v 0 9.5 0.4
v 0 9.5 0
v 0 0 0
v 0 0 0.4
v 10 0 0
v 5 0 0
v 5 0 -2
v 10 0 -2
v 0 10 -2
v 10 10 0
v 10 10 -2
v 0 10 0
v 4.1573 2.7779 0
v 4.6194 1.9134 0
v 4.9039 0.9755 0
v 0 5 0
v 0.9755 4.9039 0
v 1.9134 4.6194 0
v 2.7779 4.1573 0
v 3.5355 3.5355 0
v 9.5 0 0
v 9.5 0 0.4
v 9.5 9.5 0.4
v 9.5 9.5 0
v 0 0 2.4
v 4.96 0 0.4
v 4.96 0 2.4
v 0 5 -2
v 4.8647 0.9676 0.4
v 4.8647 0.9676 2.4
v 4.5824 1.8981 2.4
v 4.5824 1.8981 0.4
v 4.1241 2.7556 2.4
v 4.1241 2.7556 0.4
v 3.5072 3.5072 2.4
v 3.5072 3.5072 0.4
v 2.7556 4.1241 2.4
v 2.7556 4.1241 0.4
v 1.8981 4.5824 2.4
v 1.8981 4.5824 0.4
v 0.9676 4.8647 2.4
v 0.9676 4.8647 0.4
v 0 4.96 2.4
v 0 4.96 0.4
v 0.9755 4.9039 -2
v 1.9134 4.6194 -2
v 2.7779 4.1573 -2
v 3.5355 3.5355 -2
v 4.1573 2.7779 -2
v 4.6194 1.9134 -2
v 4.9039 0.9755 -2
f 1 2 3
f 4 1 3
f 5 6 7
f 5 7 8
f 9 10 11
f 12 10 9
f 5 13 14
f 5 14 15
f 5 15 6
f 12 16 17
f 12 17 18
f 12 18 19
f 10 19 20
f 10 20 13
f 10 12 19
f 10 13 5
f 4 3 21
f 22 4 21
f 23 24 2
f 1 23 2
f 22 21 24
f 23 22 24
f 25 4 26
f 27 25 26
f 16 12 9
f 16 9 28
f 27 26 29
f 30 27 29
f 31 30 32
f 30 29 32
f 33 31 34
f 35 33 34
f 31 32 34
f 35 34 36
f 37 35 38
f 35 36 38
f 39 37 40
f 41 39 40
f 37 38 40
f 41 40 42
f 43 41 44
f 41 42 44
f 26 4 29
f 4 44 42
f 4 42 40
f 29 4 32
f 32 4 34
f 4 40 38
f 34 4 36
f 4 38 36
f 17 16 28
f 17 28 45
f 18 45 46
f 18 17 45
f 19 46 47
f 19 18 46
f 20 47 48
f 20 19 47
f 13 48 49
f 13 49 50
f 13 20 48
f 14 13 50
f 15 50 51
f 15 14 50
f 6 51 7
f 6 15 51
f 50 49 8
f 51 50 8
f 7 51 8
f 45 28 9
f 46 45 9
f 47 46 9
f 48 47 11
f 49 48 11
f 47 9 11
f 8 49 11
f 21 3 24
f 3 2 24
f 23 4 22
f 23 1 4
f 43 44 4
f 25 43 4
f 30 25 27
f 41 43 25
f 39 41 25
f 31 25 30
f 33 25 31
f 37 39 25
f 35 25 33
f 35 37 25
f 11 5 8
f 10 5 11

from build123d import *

# Parameters (mm, degrees)
F1_DEPTH = 2
F3_DEPTH = 0.4
F5_DEPTH = 2


with BuildPart() as f1:
    # F0 (on Top) → F1 (new body)
    with BuildSketch(Plane.XY):
        with BuildLine():
            ThreePointArc((0, 5), (3.5355339059, 3.5355339059), (5, 0))
            Line((5, 0), (10, 0))
            Line((10, 0), (10, 10))
            Line((10, 10), (0, 10))
            Line((0, 10), (0, 5))
        make_face()
    extrude(amount=-F1_DEPTH)


with BuildPart() as f3:
    # F2 (on face) → F3 (new body)
    with BuildSketch(Plane.XY):
        with BuildLine():
            Line((0, 5), (0, 0))
            Line((0, 0), (5, 0))
            ThreePointArc((5, 0), (3.5355339059, 3.5355339059), (0, 5))
        make_face()
        with BuildLine():
            ThreePointArc((0, 5), (3.5355339059, 3.5355339059), (5, 0))
            Line((5, 0), (9.5, 0))
            Line((9.5, 0), (9.5, 9.5))
            Line((9.5, 9.5), (0, 9.5))
            Line((0, 9.5), (0, 5))
        make_face()
    extrude(amount=F3_DEPTH)


with BuildPart() as f5:
    # F4 (on face) → F5 (new body)
    with BuildSketch(Plane.XY.offset(0.4)):
        with BuildLine():
            Line((0, 0), (4.96, 0))
            ThreePointArc((4.96, 0), (3.5072496347, 3.5072496347), (0, 4.96))
            Line((0, 4.96), (0, 0))
        make_face()
    extrude(amount=F5_DEPTH)


solid = Compound([f1.part, f3.part, f5.part])
